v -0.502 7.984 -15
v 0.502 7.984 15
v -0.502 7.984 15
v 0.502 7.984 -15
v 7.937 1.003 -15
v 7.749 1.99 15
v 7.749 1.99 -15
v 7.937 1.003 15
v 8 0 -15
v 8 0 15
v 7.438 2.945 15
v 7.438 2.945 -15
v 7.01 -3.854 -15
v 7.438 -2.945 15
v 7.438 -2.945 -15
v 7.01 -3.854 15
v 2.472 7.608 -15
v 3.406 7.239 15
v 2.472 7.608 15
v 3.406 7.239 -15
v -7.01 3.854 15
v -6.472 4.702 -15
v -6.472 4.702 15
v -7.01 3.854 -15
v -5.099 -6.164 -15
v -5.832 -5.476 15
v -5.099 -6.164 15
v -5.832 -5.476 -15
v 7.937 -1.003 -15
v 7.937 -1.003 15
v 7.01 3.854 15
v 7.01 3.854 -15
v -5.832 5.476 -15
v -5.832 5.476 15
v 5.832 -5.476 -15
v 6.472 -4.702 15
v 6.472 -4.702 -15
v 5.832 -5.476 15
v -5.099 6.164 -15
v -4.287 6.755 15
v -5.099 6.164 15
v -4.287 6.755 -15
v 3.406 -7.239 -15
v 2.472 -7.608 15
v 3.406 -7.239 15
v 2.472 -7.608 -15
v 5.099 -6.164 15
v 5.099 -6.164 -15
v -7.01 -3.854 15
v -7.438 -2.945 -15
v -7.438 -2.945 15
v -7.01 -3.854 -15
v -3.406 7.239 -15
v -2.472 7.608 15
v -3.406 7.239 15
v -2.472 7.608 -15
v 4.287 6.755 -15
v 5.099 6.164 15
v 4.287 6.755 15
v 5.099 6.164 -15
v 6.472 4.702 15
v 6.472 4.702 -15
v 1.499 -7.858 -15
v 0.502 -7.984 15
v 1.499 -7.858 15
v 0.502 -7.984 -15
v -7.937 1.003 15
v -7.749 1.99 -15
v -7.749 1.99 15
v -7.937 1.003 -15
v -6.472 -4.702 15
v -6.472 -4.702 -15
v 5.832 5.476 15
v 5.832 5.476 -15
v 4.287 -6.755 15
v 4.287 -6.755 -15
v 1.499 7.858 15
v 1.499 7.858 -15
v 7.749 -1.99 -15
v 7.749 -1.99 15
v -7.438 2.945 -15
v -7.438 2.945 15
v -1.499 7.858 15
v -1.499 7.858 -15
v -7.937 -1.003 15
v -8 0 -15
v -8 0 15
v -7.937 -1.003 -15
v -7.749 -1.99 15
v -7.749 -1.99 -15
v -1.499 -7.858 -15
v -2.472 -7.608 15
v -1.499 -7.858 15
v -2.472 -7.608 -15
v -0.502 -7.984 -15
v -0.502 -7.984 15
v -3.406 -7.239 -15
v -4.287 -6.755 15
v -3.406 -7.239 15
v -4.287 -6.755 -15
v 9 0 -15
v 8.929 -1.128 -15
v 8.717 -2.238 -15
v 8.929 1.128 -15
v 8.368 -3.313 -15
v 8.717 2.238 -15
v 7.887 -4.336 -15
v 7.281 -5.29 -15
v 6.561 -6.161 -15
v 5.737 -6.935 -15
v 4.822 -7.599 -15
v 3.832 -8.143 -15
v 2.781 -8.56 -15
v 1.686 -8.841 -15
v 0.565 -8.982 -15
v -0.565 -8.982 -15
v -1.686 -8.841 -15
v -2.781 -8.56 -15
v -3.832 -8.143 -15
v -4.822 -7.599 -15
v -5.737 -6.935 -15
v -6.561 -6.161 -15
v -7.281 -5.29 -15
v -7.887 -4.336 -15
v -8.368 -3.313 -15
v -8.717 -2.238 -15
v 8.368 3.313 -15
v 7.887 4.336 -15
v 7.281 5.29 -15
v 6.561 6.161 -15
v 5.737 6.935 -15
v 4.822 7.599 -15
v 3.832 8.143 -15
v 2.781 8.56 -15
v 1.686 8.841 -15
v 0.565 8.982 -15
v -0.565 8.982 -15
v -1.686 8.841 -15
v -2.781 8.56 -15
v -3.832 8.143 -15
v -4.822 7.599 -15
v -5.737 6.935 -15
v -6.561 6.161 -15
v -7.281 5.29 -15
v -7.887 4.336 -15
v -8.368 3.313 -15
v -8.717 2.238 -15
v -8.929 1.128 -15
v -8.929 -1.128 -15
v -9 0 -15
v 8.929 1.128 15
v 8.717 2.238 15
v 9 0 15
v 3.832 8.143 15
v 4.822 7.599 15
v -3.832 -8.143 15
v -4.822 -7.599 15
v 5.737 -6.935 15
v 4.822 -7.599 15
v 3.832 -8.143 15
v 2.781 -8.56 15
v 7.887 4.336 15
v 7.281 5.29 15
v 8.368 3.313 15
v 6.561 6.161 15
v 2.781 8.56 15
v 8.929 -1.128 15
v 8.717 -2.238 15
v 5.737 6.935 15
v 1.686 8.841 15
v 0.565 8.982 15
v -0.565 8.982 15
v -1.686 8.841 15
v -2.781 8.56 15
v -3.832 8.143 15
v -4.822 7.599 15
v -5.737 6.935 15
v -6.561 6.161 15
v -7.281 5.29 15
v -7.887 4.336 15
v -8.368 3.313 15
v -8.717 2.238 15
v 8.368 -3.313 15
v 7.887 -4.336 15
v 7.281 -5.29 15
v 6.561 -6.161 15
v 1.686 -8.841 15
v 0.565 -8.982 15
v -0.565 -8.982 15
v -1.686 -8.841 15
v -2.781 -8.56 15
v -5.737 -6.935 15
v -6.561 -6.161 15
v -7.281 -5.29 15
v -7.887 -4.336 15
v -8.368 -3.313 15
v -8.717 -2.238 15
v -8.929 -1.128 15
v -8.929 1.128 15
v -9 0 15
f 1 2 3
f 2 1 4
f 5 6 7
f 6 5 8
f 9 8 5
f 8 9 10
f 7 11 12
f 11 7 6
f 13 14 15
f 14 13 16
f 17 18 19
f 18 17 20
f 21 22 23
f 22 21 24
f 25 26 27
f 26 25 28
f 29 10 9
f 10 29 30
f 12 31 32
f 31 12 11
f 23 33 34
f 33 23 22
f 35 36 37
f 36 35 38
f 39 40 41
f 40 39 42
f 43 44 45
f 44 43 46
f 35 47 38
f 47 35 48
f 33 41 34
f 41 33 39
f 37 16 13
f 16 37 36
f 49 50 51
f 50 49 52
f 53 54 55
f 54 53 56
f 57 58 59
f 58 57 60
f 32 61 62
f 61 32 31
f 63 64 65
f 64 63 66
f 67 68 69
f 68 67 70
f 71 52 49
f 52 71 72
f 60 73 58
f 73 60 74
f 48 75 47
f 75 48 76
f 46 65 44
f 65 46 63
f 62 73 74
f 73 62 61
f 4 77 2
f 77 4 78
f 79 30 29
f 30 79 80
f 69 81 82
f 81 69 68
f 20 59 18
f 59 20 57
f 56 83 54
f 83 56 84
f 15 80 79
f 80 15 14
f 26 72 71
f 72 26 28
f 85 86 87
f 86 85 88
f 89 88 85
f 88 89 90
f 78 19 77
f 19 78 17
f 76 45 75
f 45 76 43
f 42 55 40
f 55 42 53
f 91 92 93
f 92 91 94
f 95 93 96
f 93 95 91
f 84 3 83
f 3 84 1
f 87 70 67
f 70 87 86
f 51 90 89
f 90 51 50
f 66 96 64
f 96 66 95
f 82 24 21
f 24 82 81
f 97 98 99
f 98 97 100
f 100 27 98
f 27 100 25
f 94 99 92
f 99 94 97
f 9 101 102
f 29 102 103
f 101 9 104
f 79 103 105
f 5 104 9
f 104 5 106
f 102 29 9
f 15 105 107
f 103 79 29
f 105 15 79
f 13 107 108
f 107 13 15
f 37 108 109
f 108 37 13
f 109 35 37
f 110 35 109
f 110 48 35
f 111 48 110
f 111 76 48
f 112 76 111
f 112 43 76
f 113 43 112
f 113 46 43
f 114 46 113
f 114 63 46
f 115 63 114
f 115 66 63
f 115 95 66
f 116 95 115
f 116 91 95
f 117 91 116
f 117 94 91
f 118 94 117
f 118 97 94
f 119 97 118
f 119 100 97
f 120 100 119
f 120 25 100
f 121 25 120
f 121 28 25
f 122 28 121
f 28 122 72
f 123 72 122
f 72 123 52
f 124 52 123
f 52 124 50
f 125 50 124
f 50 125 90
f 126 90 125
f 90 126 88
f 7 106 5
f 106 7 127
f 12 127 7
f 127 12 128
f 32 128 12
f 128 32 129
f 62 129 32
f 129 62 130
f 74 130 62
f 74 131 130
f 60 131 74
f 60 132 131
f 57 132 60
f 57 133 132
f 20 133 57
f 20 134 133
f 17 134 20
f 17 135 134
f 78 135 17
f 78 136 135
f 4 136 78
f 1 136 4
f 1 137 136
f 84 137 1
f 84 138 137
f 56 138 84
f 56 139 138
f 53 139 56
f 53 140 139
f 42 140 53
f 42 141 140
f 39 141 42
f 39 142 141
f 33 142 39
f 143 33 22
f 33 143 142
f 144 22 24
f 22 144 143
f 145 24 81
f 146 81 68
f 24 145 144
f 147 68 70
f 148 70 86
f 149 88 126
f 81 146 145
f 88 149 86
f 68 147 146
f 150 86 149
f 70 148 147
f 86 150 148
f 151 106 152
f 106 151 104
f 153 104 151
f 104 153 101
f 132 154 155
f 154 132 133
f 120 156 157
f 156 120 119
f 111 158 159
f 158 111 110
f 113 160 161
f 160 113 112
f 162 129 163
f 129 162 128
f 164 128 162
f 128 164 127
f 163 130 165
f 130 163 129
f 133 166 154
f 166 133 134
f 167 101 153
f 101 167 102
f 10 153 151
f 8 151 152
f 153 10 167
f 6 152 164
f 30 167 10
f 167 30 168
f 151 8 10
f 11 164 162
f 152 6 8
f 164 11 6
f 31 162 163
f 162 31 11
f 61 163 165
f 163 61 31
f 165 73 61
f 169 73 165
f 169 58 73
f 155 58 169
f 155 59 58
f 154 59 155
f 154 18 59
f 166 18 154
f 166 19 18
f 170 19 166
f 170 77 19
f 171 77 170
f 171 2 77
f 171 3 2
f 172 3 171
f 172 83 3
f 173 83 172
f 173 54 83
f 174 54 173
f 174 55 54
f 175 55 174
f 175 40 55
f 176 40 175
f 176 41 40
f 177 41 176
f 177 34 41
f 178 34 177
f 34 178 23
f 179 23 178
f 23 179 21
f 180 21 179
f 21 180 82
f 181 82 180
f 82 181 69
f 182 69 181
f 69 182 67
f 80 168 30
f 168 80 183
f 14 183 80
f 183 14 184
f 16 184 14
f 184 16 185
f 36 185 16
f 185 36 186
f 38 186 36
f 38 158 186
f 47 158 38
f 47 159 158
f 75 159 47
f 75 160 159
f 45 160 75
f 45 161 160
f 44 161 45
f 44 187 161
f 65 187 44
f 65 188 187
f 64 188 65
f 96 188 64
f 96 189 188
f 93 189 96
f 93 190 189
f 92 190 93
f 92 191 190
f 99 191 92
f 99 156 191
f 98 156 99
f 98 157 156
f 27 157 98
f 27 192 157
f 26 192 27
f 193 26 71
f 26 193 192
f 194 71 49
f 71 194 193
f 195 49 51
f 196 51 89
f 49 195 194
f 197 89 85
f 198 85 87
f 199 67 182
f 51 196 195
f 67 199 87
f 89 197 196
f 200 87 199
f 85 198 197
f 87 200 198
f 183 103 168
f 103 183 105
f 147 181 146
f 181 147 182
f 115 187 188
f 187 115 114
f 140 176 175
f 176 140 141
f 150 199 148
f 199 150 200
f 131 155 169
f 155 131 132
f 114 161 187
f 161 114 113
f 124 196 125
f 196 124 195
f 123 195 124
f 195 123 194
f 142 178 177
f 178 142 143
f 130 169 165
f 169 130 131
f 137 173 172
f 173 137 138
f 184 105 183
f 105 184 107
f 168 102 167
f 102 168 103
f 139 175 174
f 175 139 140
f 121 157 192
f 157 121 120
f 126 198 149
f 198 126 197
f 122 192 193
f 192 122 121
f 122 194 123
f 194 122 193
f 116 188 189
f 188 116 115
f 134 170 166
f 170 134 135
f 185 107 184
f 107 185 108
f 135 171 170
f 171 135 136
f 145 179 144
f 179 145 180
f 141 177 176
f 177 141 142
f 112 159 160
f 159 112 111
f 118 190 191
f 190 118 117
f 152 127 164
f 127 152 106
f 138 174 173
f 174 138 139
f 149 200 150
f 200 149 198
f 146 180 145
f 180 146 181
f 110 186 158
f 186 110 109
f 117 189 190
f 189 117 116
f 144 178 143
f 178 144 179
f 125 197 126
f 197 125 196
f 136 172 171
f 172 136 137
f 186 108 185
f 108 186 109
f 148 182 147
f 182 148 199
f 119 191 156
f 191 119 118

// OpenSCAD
//Author: Lucia Prieto Godino
//mail: lucia.prieto@cantab.net
//February 2016
//Cover tubes behaviour

// Customazible variables

// height
height = 30; 
// diameter
diameter = 9; 

////////////////////////////////////////////////////////
module customizer_off(){};
////////////////////////////////////////////////////////

h1= height;
r1= diameter;
r2 = r1-1;


module Base() {
cylinder($fn=50,h= h1, r = r1, center = true);
}

//Base();

module inside() {
cylinder ( $fn=50,h = h1, r = r2, centre = true);
 translate ([0,0,-h1/2]){cylinder ($fn=50, h = h1, r = r2, centre = true);}
}

//inside();

module final() {
difference () {Base() ; inside();}
}

final();
